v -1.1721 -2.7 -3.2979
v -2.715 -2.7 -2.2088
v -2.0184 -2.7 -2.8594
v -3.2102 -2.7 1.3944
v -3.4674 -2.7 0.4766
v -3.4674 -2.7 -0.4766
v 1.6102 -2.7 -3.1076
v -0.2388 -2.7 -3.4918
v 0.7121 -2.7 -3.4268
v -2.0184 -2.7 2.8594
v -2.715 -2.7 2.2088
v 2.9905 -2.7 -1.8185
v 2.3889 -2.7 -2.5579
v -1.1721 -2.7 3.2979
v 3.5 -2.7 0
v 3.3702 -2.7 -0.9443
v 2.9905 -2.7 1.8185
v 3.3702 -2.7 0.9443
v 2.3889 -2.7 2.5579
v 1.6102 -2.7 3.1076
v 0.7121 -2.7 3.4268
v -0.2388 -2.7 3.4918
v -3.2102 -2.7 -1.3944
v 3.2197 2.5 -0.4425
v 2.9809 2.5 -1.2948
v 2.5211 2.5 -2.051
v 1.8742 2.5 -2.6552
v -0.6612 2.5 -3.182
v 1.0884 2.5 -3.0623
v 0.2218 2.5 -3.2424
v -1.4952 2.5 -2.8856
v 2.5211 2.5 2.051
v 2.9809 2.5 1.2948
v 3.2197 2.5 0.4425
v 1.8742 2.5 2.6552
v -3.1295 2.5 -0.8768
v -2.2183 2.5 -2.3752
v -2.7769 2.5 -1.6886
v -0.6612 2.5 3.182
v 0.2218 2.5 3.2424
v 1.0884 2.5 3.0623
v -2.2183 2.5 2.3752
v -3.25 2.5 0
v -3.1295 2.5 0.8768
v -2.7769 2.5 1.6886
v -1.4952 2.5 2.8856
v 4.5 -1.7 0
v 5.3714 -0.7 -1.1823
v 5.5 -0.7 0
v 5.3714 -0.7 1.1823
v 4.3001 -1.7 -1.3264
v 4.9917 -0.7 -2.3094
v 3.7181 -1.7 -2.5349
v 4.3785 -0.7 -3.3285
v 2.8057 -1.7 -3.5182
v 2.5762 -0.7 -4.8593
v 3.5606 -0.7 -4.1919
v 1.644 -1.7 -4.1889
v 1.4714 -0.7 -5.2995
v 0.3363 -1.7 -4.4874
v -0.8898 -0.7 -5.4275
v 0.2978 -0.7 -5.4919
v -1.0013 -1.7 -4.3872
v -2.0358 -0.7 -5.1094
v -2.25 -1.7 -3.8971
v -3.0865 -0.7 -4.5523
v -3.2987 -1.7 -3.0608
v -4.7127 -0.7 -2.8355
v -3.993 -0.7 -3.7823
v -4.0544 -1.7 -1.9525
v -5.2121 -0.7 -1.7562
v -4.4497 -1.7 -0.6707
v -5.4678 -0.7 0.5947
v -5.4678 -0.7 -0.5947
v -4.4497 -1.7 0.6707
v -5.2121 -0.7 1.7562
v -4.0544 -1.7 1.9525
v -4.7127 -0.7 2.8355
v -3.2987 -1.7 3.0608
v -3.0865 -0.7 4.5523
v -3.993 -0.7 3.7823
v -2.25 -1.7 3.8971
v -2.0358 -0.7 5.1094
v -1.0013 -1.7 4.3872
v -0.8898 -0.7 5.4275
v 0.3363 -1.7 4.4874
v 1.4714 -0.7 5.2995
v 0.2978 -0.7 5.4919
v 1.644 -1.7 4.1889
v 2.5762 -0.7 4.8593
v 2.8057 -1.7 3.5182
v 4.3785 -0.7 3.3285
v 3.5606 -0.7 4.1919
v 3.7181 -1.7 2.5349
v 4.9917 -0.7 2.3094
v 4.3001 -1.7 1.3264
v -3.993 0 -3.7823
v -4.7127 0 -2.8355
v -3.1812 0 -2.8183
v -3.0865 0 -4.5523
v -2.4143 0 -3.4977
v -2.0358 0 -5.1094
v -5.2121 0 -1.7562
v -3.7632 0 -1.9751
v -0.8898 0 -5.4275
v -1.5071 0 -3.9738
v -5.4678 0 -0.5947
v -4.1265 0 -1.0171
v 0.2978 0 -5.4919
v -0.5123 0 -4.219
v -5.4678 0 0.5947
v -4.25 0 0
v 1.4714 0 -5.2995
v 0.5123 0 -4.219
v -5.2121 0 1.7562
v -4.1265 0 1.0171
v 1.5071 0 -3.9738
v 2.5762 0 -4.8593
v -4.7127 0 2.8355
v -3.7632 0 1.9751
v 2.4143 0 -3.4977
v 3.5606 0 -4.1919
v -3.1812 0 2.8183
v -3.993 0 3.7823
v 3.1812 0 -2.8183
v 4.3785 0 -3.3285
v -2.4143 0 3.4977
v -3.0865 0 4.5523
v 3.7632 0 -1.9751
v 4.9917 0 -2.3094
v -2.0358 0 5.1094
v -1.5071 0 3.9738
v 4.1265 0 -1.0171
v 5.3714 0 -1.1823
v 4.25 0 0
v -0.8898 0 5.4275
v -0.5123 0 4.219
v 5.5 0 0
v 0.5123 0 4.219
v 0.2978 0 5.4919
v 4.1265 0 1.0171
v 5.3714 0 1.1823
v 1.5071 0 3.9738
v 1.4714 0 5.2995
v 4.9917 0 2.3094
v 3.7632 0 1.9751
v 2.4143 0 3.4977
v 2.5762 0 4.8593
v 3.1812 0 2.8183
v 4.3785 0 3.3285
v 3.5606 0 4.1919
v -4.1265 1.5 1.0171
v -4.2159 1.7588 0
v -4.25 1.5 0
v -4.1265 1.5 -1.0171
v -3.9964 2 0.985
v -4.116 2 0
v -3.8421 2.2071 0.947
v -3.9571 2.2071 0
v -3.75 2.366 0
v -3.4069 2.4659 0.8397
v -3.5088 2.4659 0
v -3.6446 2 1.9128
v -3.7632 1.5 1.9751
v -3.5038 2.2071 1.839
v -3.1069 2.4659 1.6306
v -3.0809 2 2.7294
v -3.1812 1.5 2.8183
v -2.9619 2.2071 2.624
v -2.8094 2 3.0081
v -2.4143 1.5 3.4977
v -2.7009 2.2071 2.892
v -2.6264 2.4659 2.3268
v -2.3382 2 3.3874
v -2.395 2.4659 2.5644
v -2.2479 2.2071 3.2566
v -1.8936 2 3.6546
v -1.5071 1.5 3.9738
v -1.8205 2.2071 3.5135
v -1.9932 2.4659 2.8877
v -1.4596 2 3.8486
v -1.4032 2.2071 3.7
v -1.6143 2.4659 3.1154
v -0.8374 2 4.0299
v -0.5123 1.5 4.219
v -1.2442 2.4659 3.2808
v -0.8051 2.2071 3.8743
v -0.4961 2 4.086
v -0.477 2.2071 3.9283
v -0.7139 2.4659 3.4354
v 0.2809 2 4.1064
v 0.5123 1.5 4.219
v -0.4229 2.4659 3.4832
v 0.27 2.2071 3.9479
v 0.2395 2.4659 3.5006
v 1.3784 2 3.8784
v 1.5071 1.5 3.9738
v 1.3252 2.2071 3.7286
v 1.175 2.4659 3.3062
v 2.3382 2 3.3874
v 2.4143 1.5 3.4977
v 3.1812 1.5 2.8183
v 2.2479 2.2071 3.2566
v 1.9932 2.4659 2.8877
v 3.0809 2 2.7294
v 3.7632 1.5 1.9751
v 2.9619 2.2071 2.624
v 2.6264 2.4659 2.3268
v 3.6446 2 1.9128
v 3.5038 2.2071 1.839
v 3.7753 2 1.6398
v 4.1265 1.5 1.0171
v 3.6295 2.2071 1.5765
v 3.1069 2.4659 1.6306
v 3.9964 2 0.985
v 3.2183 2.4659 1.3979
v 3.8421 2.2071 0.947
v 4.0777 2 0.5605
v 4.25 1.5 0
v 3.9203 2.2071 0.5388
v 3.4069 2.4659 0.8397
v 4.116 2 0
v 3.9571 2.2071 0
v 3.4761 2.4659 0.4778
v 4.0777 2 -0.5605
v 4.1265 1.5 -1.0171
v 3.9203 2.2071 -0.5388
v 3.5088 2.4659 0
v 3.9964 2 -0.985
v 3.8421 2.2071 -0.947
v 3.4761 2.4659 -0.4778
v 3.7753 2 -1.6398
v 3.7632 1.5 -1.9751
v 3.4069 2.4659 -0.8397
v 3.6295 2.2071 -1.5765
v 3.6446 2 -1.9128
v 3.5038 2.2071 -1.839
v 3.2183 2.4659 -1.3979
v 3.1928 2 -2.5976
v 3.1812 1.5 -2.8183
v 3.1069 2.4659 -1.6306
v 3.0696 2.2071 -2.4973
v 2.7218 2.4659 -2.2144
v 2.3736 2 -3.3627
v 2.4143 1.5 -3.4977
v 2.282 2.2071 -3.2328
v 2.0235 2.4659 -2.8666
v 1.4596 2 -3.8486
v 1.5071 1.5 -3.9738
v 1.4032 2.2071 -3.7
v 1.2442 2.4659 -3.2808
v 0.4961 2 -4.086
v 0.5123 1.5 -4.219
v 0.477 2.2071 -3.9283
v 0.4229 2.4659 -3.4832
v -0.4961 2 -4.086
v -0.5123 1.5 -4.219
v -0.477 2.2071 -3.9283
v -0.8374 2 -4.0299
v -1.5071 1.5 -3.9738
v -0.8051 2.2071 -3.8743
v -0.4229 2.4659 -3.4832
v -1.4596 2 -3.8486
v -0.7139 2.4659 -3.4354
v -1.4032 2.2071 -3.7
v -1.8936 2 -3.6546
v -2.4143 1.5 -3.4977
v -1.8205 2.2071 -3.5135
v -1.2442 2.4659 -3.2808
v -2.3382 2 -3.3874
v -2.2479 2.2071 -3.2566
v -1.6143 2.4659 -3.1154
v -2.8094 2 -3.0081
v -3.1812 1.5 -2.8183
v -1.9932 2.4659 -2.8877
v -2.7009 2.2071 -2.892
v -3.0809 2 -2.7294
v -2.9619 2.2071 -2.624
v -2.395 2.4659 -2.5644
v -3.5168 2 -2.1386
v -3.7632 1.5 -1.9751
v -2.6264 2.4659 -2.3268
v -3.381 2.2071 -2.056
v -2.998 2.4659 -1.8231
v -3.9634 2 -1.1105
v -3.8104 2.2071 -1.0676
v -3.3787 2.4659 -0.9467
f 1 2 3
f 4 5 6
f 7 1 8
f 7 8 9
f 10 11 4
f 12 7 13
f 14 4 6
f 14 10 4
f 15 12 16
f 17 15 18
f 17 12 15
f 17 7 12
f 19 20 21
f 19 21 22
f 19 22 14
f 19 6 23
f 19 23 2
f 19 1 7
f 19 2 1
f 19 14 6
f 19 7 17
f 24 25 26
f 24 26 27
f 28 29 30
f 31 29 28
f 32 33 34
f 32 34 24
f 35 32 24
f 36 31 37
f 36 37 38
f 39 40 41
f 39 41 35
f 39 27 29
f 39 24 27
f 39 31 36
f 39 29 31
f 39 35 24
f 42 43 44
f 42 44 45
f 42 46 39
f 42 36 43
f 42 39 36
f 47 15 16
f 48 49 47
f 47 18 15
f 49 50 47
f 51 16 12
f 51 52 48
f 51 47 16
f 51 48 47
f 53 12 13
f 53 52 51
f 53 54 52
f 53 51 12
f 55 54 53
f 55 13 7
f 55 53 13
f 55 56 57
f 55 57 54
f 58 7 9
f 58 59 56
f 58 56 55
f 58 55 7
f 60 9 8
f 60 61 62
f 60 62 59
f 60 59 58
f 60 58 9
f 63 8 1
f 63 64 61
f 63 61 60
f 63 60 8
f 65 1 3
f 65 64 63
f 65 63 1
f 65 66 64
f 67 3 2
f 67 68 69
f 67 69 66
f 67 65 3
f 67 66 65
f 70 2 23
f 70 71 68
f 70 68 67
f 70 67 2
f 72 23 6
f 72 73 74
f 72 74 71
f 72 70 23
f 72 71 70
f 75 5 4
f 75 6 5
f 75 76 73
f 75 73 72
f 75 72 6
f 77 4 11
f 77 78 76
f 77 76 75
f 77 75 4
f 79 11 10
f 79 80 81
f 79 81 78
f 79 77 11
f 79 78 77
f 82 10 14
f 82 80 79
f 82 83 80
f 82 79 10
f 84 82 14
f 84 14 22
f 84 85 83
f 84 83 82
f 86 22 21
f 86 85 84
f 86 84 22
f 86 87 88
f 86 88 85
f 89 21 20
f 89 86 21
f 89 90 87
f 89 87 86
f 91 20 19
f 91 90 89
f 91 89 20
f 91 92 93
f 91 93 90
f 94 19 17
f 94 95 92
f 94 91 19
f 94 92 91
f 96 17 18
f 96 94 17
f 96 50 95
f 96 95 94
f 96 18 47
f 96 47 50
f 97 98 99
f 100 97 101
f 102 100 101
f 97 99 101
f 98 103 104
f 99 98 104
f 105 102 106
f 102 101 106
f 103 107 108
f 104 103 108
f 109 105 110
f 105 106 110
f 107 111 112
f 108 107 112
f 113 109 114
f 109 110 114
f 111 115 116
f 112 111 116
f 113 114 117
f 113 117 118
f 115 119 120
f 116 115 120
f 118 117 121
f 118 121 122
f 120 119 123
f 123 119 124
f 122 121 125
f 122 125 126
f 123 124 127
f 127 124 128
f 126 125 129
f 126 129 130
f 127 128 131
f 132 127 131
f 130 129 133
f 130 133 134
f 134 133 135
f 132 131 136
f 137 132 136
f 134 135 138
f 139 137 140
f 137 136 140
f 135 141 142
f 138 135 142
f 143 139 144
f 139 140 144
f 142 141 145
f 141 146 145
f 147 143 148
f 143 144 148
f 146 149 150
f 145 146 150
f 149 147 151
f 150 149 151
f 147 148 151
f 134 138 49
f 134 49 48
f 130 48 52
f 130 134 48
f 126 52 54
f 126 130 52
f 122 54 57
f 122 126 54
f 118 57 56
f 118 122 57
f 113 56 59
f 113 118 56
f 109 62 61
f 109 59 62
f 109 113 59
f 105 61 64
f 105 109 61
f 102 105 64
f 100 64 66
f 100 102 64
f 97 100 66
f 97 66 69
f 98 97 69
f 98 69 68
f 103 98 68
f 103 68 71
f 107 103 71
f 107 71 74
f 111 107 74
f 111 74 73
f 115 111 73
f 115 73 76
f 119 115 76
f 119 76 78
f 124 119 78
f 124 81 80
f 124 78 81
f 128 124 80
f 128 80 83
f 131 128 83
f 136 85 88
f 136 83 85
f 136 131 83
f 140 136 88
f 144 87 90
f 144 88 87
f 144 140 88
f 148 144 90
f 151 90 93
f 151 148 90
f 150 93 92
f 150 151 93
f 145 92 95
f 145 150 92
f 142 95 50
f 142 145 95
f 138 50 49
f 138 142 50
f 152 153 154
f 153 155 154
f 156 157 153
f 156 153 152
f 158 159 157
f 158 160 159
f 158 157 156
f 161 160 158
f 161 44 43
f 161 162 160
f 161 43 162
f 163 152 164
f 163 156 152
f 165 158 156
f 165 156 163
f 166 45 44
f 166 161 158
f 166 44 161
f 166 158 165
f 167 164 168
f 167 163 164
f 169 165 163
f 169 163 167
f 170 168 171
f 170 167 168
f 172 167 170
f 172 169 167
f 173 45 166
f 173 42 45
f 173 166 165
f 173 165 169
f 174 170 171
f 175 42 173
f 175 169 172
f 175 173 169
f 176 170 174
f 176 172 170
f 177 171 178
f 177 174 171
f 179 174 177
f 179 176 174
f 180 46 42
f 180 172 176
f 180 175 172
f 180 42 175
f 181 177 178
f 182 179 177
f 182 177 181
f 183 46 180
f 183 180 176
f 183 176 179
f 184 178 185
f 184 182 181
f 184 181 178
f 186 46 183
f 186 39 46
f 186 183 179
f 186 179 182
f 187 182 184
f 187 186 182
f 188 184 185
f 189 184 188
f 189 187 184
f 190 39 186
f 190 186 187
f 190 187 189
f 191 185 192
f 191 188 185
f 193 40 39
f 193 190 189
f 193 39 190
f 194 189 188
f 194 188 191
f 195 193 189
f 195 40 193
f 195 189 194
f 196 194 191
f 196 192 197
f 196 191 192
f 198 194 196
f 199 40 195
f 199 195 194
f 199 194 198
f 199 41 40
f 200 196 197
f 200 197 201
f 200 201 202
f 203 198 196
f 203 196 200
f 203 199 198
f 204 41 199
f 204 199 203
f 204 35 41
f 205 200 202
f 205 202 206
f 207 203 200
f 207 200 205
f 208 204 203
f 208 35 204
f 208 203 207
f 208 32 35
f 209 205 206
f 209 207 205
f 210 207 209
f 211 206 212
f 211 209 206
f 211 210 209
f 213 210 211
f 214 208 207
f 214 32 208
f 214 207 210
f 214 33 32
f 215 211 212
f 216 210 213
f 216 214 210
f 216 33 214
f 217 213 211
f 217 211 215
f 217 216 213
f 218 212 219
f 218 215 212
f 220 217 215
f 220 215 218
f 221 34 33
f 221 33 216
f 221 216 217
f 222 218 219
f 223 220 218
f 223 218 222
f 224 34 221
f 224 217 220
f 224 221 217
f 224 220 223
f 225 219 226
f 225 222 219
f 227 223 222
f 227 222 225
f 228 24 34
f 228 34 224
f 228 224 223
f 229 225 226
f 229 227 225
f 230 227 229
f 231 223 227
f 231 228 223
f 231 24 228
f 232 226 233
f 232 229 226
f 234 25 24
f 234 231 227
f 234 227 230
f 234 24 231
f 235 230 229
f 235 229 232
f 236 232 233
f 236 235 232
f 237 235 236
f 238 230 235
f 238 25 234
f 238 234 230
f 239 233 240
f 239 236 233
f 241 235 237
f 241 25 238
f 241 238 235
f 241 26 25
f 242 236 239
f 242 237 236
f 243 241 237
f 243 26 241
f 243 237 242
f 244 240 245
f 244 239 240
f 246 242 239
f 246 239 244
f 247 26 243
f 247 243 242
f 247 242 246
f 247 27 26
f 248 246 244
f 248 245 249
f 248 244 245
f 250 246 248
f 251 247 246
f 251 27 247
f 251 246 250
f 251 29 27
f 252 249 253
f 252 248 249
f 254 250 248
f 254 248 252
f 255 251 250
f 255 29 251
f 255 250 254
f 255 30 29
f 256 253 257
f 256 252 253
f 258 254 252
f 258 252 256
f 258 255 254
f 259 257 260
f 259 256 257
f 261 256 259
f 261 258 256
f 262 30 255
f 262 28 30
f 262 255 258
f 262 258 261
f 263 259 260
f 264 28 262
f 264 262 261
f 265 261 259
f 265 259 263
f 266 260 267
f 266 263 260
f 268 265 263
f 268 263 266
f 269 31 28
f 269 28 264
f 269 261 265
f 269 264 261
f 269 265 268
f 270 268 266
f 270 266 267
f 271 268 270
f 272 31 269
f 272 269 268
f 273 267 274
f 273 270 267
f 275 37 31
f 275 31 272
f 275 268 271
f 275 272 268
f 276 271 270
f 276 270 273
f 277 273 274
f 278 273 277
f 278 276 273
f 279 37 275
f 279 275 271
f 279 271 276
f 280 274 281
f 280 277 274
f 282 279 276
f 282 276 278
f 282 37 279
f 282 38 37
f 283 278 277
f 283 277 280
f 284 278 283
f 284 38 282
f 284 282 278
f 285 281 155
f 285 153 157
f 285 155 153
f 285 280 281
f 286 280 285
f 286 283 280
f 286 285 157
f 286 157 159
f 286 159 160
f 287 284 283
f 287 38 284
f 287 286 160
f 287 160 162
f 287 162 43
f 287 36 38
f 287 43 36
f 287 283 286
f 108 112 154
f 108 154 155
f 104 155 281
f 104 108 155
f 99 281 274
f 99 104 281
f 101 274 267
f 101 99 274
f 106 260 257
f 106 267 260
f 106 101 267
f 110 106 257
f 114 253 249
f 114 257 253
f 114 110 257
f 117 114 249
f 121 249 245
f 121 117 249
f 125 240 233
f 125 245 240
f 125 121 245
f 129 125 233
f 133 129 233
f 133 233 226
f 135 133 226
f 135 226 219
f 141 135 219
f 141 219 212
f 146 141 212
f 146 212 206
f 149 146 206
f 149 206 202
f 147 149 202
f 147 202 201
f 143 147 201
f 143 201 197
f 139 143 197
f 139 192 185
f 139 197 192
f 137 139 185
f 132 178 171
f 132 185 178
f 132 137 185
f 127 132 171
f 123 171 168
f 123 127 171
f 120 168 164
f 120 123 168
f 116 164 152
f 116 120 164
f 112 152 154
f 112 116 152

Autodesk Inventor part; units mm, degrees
ref_plane "YZ Plane" through (0, 0, 0) normal (1, 0, 0) x (0, 1, 0)
ref_plane "XZ Plane" through (0, 0, 0) normal (0, 1, 0) x (-1, 0, 0)
ref_plane "XY Plane" through (0, 0, 0) normal (0, 0, 1) x (1, 0, 0)
sketch "Sketch1" plane through (0, 0, 0) normal (0, 1, 0) x (-1, 0, 0)
  circle A0 centre (0, 0) radius 4.25
  dimension "d0" = 8.5
extrude "Extrusion1" add sketch "Sketch1" along normal blind 2.5
sketch "Sketch2" plane through (0, 0, 0) normal (0, -1, 0) x (1, 0, 0)
  circle A0 centre (0, 0) radius 5.5
  dimension "d3" = 11
extrude "Extrusion2" add sketch "Sketch2" along normal blind 2.7
fillet "Fillet1" radius 1 1 edges at (4.25, 2.5, 0)
chamfer "Chamfer1" distance 2 angle 45 1 edges at (-5.5, -2.7, 0)
properties part number "button_round_3DPrint"
